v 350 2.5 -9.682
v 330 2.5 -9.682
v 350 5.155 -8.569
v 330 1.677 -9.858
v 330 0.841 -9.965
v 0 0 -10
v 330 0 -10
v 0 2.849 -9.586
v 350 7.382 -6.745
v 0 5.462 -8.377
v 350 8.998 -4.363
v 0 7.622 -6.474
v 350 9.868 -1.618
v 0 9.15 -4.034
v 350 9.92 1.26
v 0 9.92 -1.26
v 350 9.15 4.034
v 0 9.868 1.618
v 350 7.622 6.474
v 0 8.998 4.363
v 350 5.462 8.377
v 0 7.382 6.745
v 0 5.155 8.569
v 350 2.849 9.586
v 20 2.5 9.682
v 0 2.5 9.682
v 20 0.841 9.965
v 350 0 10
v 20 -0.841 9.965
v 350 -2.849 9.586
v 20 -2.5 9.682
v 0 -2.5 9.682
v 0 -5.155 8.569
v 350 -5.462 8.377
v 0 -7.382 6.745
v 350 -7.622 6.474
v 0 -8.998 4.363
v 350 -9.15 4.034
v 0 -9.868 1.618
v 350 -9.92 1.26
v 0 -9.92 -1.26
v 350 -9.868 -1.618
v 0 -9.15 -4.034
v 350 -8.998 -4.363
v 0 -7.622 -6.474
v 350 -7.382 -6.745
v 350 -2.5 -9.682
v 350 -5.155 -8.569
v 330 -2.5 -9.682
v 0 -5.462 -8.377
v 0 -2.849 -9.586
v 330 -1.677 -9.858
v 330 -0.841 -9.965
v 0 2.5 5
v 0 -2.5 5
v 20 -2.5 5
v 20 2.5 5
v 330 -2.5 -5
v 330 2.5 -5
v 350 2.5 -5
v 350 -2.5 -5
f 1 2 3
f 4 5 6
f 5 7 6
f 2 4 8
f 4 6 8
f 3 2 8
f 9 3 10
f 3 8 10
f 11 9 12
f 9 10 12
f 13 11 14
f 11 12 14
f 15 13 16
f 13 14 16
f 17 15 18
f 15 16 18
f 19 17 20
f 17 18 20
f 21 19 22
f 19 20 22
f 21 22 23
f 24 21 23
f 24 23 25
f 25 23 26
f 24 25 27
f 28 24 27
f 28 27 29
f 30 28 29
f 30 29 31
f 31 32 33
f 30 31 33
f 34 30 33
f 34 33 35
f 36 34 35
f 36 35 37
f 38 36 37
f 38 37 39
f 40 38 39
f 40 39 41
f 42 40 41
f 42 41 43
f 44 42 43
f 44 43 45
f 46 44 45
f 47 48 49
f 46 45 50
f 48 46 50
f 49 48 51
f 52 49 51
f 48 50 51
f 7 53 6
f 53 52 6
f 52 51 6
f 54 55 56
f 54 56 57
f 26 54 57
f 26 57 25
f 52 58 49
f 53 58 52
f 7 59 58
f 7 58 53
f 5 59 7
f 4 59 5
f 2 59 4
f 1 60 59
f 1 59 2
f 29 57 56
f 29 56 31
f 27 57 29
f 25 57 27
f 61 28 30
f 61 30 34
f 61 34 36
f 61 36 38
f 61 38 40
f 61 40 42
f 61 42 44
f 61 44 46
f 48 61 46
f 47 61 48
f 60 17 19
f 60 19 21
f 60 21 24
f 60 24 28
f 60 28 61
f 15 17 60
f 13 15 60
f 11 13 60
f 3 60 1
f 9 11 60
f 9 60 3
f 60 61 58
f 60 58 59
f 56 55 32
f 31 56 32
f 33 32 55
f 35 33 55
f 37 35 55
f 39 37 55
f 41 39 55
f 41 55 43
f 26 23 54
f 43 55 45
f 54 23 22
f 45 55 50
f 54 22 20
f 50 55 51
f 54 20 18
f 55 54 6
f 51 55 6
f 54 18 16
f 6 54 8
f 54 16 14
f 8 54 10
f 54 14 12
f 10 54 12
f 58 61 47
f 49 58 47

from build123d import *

# Parameters (mm, degrees)
SKETCH1_R           = 10
BOSS_EXTRUDE1_DEPTH = 350
SKETCH2_W           = 10
SKETCH2_H           = 5
CUT_EXTRUDE1_DEPTH  = 20
SKETCH3_W           = 10
SKETCH3_H           = 5
CUT_EXTRUDE2_DEPTH  = 20


with BuildPart() as part:
    # Sketch1 → Boss-Extrude1 (new body)
    with BuildSketch(Plane(origin=(0, 0, 0), x_dir=(0, 0, -1), z_dir=(1, 0, 0))):
        Circle(SKETCH1_R)
    extrude(amount=BOSS_EXTRUDE1_DEPTH)

    # Sketch2 → Cut-Extrude1 (cut)
    with BuildSketch(Plane.ZY):
        with Locations((10, 0)):
            Rectangle(SKETCH2_W, SKETCH2_H)
    extrude(amount=-CUT_EXTRUDE1_DEPTH, mode=Mode.SUBTRACT)

    # Sketch3 → Cut-Extrude2 (cut)
    with BuildSketch(Plane(origin=(350, 0, 0), x_dir=(0, 0, -1), z_dir=(1, 0, 0))):
        with Locations((10, 0)):
            Rectangle(SKETCH3_W, SKETCH3_H)
    extrude(amount=-CUT_EXTRUDE2_DEPTH, mode=Mode.SUBTRACT)


solid = part.part
